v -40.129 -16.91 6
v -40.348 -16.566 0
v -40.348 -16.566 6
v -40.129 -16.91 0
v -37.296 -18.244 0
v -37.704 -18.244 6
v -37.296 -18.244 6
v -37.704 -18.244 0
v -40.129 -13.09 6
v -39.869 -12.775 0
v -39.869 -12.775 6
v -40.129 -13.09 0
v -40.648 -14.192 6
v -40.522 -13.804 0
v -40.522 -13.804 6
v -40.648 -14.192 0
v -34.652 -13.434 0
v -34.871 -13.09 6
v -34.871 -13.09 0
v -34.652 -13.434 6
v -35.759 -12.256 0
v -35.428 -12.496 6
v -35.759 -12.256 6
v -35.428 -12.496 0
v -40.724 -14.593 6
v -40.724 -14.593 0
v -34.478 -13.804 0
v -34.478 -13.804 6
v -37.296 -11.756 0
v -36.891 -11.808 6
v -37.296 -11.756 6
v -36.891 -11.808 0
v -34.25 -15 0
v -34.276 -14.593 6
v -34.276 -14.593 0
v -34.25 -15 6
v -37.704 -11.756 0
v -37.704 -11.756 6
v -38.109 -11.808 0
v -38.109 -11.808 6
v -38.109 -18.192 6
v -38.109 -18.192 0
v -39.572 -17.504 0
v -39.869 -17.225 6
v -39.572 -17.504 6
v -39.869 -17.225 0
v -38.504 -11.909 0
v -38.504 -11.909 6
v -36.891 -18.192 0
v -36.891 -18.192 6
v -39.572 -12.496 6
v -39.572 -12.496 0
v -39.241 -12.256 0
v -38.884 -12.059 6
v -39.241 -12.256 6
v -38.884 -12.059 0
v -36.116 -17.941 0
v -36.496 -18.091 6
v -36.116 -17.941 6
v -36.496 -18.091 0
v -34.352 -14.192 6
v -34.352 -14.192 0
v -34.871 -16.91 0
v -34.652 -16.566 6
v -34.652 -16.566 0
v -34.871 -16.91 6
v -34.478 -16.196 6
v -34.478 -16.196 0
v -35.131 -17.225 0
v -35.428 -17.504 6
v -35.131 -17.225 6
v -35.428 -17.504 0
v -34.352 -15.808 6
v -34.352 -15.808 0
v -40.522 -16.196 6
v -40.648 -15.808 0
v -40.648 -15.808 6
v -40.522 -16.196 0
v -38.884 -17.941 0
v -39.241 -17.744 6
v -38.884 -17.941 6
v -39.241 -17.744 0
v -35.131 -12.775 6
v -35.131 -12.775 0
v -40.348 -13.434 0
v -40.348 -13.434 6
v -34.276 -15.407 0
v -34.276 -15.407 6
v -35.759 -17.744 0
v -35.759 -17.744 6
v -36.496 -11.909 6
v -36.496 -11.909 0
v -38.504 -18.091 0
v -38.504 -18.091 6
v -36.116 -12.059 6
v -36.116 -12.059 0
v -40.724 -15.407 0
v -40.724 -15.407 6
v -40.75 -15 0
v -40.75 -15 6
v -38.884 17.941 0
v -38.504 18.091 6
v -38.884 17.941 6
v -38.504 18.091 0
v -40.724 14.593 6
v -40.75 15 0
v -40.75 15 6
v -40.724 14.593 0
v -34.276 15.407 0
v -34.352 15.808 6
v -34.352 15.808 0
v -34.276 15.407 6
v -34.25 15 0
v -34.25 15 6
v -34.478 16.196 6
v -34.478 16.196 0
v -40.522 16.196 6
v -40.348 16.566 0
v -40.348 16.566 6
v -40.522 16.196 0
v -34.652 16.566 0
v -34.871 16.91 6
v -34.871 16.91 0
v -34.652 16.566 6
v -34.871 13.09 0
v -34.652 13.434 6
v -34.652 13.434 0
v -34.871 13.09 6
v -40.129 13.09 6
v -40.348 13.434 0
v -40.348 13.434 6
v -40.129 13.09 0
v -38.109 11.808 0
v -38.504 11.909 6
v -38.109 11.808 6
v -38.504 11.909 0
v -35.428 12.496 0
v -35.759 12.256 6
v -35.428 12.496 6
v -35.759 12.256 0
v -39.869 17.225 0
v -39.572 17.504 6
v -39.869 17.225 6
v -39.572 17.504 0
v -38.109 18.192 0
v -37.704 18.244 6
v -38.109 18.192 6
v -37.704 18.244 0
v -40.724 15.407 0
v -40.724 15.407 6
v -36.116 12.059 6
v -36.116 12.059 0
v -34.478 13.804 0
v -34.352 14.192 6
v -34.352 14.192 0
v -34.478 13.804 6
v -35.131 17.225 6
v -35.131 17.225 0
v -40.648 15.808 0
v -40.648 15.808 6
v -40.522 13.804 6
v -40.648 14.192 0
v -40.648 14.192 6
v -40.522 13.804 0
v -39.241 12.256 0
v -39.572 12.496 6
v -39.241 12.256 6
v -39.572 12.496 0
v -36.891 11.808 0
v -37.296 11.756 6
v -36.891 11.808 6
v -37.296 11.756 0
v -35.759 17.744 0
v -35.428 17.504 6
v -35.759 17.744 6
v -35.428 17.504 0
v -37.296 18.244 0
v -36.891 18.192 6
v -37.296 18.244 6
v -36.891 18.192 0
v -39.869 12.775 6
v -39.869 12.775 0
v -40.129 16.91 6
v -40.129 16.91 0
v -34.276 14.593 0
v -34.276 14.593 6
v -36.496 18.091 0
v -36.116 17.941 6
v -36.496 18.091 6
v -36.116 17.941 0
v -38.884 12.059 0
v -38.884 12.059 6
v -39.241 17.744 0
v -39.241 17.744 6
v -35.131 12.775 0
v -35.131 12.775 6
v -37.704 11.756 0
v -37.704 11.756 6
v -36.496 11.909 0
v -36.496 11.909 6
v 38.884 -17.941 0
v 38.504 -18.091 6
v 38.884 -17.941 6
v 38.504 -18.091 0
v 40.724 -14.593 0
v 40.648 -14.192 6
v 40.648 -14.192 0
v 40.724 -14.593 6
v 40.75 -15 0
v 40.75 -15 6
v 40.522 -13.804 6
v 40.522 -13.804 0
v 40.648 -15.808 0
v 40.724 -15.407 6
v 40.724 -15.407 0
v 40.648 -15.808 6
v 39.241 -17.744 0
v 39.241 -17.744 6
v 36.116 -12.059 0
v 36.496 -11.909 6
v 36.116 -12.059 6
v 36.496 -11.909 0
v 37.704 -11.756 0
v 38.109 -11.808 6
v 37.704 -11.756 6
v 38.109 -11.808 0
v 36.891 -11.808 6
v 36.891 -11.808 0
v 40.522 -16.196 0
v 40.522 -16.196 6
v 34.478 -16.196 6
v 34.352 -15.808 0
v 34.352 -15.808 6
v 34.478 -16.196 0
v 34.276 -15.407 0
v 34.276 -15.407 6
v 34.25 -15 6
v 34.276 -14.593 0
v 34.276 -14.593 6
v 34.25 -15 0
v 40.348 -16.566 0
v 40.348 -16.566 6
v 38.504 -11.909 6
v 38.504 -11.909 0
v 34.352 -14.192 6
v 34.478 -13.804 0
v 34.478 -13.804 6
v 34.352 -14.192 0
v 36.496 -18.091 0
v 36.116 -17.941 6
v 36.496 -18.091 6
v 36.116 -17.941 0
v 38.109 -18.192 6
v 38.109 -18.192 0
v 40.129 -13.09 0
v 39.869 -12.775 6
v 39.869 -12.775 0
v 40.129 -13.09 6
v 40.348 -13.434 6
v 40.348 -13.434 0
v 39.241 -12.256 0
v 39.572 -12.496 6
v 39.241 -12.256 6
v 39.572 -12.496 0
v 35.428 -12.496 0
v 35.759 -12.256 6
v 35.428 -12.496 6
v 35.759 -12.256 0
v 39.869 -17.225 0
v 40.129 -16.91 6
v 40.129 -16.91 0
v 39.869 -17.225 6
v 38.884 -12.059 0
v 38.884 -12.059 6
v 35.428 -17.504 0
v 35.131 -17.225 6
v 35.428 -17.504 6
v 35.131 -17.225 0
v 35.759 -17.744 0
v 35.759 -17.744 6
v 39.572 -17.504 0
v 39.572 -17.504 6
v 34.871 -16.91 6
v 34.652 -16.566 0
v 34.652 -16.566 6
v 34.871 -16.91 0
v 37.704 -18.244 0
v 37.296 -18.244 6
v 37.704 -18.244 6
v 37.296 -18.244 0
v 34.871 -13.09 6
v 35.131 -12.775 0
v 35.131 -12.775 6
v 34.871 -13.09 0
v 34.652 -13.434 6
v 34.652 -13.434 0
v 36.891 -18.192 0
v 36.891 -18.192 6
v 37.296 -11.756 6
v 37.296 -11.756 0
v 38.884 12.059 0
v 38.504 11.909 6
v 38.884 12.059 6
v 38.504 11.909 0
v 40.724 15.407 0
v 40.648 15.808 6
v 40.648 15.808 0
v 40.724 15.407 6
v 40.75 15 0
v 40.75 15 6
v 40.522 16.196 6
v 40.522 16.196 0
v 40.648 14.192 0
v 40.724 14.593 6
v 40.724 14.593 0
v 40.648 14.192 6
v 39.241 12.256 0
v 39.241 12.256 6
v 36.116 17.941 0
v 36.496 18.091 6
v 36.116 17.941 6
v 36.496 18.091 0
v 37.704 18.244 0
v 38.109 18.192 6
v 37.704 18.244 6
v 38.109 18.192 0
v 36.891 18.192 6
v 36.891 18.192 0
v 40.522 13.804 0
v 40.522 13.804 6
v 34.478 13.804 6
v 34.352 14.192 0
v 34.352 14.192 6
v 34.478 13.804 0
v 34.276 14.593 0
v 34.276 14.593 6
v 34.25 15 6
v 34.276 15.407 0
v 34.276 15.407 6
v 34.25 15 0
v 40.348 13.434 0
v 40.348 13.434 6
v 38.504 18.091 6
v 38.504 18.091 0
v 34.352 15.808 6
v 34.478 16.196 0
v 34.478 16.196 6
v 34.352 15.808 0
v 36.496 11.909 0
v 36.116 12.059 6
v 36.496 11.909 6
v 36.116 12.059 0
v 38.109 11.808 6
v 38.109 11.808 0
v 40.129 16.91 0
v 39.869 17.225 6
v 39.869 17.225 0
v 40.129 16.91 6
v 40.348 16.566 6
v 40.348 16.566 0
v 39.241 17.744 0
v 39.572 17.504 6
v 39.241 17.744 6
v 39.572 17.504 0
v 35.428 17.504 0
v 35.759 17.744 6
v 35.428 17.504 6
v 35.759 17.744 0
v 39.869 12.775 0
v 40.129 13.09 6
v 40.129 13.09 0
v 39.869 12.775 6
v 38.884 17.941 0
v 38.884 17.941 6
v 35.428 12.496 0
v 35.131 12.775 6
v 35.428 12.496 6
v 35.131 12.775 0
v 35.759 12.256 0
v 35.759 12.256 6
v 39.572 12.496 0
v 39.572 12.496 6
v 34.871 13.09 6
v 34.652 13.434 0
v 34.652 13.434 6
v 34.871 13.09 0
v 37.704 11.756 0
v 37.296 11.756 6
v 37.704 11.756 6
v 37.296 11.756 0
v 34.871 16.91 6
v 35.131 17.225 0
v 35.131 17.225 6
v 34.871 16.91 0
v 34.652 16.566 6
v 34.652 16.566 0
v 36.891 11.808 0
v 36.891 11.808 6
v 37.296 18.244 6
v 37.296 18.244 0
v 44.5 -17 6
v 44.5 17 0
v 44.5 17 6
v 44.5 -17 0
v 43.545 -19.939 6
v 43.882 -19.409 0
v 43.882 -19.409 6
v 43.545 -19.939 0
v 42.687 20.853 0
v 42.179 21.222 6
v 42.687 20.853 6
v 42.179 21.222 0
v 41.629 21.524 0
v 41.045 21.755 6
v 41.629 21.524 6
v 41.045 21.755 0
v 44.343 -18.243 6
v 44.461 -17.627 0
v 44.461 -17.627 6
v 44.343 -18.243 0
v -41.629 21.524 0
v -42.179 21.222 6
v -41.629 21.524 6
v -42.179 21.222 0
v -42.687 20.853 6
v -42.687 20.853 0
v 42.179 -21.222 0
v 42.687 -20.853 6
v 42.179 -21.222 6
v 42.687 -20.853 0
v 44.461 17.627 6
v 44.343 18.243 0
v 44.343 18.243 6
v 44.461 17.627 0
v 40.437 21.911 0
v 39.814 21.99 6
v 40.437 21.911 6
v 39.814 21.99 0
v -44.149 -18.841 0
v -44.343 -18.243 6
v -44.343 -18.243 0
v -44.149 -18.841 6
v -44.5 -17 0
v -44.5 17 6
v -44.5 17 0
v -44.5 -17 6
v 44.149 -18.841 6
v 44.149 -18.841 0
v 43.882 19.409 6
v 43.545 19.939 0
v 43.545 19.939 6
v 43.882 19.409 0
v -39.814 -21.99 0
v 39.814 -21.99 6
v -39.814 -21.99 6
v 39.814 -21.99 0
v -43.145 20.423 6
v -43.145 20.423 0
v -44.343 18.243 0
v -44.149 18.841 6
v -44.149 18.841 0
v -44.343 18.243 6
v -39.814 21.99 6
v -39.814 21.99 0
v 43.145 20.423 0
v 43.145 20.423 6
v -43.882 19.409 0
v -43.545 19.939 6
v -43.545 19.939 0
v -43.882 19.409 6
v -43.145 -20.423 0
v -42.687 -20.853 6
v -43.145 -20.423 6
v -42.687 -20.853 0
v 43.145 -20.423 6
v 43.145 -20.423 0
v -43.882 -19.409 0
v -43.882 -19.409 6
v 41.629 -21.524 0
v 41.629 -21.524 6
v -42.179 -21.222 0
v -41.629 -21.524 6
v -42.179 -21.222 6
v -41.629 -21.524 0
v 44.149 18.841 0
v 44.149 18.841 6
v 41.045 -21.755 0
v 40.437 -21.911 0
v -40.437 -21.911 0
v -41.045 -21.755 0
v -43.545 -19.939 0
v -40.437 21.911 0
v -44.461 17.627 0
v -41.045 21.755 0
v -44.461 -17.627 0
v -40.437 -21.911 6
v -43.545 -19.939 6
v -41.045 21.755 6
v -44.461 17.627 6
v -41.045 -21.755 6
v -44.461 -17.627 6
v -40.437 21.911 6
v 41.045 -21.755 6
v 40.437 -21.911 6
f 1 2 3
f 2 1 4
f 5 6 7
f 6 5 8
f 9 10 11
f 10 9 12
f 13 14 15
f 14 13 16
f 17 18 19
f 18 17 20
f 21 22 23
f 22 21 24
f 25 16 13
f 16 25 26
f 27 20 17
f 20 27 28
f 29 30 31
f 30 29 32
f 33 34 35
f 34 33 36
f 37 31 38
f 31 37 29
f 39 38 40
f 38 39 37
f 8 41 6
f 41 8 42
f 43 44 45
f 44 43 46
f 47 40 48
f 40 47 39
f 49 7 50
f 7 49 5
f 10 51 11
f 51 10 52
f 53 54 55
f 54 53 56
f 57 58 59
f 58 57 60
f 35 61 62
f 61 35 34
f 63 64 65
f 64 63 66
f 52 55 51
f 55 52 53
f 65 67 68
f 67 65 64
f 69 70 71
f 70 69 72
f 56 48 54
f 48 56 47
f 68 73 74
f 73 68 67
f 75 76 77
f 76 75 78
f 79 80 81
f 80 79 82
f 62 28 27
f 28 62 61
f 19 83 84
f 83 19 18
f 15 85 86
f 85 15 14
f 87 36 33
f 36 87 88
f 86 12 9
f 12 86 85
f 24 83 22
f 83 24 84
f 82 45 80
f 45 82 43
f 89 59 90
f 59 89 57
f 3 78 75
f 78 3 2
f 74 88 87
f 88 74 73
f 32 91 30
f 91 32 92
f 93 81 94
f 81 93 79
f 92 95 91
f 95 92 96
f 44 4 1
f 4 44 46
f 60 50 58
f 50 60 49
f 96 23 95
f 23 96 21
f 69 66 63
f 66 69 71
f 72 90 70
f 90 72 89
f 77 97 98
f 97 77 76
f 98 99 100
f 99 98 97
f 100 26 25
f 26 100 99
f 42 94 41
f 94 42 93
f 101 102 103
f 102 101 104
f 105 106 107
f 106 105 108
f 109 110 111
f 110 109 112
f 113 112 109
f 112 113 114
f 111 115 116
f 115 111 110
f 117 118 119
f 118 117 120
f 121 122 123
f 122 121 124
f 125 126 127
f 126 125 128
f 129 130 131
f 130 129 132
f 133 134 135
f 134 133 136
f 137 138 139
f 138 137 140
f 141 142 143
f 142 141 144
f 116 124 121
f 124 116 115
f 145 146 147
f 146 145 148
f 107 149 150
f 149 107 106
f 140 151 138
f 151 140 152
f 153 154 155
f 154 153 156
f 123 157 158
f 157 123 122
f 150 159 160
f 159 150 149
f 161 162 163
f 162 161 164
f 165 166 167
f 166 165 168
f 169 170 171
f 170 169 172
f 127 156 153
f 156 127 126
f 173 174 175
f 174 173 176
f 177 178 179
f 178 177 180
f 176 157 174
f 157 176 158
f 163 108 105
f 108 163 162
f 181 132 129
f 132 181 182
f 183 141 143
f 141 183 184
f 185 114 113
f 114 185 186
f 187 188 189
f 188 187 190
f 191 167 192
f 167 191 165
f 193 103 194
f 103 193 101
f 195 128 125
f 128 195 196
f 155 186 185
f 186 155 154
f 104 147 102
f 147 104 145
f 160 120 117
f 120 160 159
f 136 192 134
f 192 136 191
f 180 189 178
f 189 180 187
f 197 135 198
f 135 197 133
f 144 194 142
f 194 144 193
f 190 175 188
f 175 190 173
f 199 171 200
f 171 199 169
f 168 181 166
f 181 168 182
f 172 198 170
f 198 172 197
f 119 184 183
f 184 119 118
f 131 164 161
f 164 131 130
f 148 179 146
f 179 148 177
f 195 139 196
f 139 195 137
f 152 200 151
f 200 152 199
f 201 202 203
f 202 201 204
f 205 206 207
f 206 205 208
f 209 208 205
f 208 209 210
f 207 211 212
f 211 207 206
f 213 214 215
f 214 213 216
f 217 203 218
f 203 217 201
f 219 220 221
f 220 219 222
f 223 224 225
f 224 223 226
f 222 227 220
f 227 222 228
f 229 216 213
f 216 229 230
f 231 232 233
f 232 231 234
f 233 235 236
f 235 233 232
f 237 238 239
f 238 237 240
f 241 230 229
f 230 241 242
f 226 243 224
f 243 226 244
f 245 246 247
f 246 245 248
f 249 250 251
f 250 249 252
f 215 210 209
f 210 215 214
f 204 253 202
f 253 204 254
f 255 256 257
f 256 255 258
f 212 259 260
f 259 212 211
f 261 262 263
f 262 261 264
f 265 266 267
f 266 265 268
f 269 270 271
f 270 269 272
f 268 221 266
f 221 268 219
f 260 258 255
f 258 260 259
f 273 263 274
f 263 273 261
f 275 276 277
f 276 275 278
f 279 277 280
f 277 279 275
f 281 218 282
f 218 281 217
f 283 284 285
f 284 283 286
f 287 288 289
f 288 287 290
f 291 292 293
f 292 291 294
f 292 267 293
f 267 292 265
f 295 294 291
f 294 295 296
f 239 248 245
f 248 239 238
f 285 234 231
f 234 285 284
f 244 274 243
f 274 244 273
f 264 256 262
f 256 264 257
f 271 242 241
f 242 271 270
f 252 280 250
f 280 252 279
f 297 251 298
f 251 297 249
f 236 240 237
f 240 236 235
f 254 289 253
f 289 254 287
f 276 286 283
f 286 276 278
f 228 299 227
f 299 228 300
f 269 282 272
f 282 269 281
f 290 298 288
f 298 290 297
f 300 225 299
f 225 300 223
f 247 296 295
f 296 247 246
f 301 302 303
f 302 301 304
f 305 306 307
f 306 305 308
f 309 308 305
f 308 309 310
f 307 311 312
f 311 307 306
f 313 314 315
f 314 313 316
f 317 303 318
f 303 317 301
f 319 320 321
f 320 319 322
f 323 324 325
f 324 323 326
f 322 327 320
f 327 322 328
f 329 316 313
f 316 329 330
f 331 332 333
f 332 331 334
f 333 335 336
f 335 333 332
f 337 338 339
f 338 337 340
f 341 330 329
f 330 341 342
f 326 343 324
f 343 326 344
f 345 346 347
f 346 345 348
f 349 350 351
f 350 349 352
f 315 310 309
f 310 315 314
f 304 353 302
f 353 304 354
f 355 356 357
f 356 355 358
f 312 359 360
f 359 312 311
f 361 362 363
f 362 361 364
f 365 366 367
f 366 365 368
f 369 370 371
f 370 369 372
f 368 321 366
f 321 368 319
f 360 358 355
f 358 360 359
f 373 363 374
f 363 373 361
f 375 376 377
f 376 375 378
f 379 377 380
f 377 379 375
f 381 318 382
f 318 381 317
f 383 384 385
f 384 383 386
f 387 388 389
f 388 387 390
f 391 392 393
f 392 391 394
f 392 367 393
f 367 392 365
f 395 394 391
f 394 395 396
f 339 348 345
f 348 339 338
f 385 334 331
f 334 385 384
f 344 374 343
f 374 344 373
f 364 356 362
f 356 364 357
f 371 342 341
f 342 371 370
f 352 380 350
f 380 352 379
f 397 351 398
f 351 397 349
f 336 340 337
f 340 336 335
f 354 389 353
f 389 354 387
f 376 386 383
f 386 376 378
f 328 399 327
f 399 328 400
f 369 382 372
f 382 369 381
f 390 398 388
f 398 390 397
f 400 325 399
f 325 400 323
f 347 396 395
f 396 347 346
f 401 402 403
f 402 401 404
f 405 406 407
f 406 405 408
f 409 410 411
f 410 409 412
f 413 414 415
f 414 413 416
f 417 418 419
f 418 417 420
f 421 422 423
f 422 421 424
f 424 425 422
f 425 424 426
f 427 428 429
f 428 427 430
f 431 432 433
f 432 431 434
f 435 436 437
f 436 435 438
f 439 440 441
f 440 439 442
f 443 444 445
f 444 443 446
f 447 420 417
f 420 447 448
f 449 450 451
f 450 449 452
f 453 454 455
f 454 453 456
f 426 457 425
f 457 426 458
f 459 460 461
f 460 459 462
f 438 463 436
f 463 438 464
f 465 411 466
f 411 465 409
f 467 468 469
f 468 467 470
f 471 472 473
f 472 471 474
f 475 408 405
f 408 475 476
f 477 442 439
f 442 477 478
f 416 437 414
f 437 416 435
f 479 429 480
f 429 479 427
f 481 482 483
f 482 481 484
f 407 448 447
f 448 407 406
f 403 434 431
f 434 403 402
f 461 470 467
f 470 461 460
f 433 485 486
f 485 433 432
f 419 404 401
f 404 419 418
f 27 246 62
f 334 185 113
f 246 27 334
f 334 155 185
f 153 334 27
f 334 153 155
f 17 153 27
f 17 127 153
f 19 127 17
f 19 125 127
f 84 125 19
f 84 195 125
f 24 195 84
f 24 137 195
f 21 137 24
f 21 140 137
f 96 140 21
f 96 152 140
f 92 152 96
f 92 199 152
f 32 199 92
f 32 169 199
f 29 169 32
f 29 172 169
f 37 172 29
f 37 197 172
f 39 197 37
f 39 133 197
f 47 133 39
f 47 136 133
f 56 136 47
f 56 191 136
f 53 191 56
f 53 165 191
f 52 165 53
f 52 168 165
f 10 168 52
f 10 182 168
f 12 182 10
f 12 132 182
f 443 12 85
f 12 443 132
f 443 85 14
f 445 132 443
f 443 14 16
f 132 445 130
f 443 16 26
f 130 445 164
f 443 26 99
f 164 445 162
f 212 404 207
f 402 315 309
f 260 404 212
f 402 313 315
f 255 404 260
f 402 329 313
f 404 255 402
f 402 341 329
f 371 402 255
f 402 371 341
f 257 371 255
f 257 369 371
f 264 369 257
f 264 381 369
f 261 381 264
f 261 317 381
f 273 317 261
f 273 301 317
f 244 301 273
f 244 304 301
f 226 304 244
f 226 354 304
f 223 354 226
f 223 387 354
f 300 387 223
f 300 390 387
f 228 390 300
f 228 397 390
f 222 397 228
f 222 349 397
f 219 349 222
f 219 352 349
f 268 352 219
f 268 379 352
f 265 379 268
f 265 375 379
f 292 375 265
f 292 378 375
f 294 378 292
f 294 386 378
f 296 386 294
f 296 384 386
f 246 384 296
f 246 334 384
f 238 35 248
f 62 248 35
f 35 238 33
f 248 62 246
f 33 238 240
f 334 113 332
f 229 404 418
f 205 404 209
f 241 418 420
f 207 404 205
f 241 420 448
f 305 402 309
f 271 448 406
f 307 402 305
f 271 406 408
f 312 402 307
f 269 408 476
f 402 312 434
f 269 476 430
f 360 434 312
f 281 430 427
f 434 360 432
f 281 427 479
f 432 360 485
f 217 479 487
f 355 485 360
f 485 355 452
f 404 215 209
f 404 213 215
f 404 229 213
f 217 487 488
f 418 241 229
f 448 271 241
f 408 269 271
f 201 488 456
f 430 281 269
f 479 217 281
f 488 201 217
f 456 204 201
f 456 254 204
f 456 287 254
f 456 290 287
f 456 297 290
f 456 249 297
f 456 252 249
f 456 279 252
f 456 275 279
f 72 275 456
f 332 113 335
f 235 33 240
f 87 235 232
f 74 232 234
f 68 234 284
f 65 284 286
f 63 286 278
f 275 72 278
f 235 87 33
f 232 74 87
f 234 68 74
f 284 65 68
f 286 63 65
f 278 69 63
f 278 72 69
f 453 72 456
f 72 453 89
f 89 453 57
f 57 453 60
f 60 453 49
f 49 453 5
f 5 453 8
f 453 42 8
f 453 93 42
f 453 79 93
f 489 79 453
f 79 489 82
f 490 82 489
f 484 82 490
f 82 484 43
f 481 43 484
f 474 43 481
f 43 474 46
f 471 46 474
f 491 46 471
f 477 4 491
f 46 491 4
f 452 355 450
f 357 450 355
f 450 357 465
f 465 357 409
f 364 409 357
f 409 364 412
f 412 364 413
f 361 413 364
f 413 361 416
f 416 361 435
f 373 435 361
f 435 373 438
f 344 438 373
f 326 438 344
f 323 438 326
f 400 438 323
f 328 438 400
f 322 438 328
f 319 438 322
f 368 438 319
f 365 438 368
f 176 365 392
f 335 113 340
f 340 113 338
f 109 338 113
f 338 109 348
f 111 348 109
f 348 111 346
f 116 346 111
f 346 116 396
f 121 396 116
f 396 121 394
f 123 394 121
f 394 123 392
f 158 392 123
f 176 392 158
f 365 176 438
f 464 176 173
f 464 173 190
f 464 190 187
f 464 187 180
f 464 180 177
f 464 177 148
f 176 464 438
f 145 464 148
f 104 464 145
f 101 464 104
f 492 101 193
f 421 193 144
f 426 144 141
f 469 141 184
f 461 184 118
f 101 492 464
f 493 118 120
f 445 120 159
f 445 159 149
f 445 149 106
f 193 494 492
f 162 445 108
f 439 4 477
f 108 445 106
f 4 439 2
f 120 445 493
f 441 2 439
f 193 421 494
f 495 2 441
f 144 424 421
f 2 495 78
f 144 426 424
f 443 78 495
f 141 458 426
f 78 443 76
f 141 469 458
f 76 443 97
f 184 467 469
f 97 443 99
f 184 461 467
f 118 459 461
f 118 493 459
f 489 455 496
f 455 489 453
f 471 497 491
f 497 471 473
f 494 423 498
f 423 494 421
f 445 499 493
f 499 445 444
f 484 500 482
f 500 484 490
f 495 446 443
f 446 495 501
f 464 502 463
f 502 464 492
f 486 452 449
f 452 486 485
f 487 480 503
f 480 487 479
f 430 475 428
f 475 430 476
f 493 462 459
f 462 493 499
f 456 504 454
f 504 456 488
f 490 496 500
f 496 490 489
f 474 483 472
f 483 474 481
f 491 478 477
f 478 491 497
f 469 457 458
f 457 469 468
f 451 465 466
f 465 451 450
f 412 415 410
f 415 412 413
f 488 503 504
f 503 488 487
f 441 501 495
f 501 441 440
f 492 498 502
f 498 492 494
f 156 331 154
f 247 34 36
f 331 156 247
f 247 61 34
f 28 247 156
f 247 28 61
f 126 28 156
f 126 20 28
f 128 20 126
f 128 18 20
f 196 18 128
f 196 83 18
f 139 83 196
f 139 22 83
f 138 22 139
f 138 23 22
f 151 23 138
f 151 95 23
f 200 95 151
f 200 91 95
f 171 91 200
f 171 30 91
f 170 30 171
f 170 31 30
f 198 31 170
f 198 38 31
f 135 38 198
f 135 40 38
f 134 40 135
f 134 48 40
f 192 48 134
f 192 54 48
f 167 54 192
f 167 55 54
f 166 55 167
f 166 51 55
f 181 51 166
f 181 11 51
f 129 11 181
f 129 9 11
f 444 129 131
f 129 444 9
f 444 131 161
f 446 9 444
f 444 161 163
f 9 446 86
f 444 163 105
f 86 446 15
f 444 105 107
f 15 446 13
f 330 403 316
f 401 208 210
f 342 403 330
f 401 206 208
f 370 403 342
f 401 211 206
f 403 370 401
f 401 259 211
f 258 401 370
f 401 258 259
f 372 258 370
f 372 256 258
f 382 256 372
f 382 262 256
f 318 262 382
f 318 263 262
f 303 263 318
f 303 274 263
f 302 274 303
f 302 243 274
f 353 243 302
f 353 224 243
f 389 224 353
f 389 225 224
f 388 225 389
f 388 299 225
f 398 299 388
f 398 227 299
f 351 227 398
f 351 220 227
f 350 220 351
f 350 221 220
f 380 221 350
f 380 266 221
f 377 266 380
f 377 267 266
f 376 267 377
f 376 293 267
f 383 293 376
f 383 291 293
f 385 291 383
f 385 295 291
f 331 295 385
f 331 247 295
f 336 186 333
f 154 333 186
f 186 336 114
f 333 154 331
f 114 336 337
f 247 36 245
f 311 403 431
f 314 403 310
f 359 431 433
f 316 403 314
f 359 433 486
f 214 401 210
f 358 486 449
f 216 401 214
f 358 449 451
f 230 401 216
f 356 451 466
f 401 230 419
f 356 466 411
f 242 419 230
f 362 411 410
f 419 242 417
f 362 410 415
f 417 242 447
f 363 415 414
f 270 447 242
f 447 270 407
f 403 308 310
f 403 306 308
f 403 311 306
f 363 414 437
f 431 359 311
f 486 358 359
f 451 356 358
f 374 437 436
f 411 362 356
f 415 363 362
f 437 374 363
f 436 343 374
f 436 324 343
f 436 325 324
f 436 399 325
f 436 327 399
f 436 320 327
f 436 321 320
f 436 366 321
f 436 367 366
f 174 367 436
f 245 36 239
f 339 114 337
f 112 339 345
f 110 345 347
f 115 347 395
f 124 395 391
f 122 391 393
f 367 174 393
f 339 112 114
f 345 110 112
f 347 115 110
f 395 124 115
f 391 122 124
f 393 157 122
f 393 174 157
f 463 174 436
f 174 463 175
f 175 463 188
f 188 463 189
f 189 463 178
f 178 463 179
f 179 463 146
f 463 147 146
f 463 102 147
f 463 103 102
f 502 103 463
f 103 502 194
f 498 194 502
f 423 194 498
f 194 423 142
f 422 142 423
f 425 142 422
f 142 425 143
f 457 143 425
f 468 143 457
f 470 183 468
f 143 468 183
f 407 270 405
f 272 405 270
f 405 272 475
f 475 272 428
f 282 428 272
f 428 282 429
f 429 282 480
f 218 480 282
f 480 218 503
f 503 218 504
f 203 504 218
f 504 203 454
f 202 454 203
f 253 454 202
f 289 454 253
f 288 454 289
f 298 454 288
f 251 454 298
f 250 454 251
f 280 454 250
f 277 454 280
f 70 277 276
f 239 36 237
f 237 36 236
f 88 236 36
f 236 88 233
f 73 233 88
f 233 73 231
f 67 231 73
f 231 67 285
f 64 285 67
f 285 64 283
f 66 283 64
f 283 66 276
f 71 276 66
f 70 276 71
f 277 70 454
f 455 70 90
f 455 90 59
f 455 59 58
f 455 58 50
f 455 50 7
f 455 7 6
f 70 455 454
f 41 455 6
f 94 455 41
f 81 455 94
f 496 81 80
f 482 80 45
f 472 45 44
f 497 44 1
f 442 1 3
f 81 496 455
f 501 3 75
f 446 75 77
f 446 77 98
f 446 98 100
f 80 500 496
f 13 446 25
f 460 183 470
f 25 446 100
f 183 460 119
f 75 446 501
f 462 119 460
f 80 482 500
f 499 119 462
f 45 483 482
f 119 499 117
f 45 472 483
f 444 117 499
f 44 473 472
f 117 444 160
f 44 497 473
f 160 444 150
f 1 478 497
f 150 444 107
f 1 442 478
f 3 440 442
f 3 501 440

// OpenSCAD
$fn = 50;


difference() {
	union() {
		hull() {
			translate(v = [-39.5000000000, 17.0000000000, 0]) {
				cylinder(h = 6, r = 5);
			}
			translate(v = [39.5000000000, 17.0000000000, 0]) {
				cylinder(h = 6, r = 5);
			}
			translate(v = [-39.5000000000, -17.0000000000, 0]) {
				cylinder(h = 6, r = 5);
			}
			translate(v = [39.5000000000, -17.0000000000, 0]) {
				cylinder(h = 6, r = 5);
			}
		}
	}
	union() {
		translate(v = [-37.5000000000, -15.0000000000, -100.0000000000]) {
			cylinder(h = 200, r = 3.2500000000);
		}
		translate(v = [-37.5000000000, 15.0000000000, -100.0000000000]) {
			cylinder(h = 200, r = 3.2500000000);
		}
		translate(v = [37.5000000000, -15.0000000000, -100.0000000000]) {
			cylinder(h = 200, r = 3.2500000000);
		}
		translate(v = [37.5000000000, 15.0000000000, -100.0000000000]) {
			cylinder(h = 200, r = 3.2500000000);
		}
	}
}
